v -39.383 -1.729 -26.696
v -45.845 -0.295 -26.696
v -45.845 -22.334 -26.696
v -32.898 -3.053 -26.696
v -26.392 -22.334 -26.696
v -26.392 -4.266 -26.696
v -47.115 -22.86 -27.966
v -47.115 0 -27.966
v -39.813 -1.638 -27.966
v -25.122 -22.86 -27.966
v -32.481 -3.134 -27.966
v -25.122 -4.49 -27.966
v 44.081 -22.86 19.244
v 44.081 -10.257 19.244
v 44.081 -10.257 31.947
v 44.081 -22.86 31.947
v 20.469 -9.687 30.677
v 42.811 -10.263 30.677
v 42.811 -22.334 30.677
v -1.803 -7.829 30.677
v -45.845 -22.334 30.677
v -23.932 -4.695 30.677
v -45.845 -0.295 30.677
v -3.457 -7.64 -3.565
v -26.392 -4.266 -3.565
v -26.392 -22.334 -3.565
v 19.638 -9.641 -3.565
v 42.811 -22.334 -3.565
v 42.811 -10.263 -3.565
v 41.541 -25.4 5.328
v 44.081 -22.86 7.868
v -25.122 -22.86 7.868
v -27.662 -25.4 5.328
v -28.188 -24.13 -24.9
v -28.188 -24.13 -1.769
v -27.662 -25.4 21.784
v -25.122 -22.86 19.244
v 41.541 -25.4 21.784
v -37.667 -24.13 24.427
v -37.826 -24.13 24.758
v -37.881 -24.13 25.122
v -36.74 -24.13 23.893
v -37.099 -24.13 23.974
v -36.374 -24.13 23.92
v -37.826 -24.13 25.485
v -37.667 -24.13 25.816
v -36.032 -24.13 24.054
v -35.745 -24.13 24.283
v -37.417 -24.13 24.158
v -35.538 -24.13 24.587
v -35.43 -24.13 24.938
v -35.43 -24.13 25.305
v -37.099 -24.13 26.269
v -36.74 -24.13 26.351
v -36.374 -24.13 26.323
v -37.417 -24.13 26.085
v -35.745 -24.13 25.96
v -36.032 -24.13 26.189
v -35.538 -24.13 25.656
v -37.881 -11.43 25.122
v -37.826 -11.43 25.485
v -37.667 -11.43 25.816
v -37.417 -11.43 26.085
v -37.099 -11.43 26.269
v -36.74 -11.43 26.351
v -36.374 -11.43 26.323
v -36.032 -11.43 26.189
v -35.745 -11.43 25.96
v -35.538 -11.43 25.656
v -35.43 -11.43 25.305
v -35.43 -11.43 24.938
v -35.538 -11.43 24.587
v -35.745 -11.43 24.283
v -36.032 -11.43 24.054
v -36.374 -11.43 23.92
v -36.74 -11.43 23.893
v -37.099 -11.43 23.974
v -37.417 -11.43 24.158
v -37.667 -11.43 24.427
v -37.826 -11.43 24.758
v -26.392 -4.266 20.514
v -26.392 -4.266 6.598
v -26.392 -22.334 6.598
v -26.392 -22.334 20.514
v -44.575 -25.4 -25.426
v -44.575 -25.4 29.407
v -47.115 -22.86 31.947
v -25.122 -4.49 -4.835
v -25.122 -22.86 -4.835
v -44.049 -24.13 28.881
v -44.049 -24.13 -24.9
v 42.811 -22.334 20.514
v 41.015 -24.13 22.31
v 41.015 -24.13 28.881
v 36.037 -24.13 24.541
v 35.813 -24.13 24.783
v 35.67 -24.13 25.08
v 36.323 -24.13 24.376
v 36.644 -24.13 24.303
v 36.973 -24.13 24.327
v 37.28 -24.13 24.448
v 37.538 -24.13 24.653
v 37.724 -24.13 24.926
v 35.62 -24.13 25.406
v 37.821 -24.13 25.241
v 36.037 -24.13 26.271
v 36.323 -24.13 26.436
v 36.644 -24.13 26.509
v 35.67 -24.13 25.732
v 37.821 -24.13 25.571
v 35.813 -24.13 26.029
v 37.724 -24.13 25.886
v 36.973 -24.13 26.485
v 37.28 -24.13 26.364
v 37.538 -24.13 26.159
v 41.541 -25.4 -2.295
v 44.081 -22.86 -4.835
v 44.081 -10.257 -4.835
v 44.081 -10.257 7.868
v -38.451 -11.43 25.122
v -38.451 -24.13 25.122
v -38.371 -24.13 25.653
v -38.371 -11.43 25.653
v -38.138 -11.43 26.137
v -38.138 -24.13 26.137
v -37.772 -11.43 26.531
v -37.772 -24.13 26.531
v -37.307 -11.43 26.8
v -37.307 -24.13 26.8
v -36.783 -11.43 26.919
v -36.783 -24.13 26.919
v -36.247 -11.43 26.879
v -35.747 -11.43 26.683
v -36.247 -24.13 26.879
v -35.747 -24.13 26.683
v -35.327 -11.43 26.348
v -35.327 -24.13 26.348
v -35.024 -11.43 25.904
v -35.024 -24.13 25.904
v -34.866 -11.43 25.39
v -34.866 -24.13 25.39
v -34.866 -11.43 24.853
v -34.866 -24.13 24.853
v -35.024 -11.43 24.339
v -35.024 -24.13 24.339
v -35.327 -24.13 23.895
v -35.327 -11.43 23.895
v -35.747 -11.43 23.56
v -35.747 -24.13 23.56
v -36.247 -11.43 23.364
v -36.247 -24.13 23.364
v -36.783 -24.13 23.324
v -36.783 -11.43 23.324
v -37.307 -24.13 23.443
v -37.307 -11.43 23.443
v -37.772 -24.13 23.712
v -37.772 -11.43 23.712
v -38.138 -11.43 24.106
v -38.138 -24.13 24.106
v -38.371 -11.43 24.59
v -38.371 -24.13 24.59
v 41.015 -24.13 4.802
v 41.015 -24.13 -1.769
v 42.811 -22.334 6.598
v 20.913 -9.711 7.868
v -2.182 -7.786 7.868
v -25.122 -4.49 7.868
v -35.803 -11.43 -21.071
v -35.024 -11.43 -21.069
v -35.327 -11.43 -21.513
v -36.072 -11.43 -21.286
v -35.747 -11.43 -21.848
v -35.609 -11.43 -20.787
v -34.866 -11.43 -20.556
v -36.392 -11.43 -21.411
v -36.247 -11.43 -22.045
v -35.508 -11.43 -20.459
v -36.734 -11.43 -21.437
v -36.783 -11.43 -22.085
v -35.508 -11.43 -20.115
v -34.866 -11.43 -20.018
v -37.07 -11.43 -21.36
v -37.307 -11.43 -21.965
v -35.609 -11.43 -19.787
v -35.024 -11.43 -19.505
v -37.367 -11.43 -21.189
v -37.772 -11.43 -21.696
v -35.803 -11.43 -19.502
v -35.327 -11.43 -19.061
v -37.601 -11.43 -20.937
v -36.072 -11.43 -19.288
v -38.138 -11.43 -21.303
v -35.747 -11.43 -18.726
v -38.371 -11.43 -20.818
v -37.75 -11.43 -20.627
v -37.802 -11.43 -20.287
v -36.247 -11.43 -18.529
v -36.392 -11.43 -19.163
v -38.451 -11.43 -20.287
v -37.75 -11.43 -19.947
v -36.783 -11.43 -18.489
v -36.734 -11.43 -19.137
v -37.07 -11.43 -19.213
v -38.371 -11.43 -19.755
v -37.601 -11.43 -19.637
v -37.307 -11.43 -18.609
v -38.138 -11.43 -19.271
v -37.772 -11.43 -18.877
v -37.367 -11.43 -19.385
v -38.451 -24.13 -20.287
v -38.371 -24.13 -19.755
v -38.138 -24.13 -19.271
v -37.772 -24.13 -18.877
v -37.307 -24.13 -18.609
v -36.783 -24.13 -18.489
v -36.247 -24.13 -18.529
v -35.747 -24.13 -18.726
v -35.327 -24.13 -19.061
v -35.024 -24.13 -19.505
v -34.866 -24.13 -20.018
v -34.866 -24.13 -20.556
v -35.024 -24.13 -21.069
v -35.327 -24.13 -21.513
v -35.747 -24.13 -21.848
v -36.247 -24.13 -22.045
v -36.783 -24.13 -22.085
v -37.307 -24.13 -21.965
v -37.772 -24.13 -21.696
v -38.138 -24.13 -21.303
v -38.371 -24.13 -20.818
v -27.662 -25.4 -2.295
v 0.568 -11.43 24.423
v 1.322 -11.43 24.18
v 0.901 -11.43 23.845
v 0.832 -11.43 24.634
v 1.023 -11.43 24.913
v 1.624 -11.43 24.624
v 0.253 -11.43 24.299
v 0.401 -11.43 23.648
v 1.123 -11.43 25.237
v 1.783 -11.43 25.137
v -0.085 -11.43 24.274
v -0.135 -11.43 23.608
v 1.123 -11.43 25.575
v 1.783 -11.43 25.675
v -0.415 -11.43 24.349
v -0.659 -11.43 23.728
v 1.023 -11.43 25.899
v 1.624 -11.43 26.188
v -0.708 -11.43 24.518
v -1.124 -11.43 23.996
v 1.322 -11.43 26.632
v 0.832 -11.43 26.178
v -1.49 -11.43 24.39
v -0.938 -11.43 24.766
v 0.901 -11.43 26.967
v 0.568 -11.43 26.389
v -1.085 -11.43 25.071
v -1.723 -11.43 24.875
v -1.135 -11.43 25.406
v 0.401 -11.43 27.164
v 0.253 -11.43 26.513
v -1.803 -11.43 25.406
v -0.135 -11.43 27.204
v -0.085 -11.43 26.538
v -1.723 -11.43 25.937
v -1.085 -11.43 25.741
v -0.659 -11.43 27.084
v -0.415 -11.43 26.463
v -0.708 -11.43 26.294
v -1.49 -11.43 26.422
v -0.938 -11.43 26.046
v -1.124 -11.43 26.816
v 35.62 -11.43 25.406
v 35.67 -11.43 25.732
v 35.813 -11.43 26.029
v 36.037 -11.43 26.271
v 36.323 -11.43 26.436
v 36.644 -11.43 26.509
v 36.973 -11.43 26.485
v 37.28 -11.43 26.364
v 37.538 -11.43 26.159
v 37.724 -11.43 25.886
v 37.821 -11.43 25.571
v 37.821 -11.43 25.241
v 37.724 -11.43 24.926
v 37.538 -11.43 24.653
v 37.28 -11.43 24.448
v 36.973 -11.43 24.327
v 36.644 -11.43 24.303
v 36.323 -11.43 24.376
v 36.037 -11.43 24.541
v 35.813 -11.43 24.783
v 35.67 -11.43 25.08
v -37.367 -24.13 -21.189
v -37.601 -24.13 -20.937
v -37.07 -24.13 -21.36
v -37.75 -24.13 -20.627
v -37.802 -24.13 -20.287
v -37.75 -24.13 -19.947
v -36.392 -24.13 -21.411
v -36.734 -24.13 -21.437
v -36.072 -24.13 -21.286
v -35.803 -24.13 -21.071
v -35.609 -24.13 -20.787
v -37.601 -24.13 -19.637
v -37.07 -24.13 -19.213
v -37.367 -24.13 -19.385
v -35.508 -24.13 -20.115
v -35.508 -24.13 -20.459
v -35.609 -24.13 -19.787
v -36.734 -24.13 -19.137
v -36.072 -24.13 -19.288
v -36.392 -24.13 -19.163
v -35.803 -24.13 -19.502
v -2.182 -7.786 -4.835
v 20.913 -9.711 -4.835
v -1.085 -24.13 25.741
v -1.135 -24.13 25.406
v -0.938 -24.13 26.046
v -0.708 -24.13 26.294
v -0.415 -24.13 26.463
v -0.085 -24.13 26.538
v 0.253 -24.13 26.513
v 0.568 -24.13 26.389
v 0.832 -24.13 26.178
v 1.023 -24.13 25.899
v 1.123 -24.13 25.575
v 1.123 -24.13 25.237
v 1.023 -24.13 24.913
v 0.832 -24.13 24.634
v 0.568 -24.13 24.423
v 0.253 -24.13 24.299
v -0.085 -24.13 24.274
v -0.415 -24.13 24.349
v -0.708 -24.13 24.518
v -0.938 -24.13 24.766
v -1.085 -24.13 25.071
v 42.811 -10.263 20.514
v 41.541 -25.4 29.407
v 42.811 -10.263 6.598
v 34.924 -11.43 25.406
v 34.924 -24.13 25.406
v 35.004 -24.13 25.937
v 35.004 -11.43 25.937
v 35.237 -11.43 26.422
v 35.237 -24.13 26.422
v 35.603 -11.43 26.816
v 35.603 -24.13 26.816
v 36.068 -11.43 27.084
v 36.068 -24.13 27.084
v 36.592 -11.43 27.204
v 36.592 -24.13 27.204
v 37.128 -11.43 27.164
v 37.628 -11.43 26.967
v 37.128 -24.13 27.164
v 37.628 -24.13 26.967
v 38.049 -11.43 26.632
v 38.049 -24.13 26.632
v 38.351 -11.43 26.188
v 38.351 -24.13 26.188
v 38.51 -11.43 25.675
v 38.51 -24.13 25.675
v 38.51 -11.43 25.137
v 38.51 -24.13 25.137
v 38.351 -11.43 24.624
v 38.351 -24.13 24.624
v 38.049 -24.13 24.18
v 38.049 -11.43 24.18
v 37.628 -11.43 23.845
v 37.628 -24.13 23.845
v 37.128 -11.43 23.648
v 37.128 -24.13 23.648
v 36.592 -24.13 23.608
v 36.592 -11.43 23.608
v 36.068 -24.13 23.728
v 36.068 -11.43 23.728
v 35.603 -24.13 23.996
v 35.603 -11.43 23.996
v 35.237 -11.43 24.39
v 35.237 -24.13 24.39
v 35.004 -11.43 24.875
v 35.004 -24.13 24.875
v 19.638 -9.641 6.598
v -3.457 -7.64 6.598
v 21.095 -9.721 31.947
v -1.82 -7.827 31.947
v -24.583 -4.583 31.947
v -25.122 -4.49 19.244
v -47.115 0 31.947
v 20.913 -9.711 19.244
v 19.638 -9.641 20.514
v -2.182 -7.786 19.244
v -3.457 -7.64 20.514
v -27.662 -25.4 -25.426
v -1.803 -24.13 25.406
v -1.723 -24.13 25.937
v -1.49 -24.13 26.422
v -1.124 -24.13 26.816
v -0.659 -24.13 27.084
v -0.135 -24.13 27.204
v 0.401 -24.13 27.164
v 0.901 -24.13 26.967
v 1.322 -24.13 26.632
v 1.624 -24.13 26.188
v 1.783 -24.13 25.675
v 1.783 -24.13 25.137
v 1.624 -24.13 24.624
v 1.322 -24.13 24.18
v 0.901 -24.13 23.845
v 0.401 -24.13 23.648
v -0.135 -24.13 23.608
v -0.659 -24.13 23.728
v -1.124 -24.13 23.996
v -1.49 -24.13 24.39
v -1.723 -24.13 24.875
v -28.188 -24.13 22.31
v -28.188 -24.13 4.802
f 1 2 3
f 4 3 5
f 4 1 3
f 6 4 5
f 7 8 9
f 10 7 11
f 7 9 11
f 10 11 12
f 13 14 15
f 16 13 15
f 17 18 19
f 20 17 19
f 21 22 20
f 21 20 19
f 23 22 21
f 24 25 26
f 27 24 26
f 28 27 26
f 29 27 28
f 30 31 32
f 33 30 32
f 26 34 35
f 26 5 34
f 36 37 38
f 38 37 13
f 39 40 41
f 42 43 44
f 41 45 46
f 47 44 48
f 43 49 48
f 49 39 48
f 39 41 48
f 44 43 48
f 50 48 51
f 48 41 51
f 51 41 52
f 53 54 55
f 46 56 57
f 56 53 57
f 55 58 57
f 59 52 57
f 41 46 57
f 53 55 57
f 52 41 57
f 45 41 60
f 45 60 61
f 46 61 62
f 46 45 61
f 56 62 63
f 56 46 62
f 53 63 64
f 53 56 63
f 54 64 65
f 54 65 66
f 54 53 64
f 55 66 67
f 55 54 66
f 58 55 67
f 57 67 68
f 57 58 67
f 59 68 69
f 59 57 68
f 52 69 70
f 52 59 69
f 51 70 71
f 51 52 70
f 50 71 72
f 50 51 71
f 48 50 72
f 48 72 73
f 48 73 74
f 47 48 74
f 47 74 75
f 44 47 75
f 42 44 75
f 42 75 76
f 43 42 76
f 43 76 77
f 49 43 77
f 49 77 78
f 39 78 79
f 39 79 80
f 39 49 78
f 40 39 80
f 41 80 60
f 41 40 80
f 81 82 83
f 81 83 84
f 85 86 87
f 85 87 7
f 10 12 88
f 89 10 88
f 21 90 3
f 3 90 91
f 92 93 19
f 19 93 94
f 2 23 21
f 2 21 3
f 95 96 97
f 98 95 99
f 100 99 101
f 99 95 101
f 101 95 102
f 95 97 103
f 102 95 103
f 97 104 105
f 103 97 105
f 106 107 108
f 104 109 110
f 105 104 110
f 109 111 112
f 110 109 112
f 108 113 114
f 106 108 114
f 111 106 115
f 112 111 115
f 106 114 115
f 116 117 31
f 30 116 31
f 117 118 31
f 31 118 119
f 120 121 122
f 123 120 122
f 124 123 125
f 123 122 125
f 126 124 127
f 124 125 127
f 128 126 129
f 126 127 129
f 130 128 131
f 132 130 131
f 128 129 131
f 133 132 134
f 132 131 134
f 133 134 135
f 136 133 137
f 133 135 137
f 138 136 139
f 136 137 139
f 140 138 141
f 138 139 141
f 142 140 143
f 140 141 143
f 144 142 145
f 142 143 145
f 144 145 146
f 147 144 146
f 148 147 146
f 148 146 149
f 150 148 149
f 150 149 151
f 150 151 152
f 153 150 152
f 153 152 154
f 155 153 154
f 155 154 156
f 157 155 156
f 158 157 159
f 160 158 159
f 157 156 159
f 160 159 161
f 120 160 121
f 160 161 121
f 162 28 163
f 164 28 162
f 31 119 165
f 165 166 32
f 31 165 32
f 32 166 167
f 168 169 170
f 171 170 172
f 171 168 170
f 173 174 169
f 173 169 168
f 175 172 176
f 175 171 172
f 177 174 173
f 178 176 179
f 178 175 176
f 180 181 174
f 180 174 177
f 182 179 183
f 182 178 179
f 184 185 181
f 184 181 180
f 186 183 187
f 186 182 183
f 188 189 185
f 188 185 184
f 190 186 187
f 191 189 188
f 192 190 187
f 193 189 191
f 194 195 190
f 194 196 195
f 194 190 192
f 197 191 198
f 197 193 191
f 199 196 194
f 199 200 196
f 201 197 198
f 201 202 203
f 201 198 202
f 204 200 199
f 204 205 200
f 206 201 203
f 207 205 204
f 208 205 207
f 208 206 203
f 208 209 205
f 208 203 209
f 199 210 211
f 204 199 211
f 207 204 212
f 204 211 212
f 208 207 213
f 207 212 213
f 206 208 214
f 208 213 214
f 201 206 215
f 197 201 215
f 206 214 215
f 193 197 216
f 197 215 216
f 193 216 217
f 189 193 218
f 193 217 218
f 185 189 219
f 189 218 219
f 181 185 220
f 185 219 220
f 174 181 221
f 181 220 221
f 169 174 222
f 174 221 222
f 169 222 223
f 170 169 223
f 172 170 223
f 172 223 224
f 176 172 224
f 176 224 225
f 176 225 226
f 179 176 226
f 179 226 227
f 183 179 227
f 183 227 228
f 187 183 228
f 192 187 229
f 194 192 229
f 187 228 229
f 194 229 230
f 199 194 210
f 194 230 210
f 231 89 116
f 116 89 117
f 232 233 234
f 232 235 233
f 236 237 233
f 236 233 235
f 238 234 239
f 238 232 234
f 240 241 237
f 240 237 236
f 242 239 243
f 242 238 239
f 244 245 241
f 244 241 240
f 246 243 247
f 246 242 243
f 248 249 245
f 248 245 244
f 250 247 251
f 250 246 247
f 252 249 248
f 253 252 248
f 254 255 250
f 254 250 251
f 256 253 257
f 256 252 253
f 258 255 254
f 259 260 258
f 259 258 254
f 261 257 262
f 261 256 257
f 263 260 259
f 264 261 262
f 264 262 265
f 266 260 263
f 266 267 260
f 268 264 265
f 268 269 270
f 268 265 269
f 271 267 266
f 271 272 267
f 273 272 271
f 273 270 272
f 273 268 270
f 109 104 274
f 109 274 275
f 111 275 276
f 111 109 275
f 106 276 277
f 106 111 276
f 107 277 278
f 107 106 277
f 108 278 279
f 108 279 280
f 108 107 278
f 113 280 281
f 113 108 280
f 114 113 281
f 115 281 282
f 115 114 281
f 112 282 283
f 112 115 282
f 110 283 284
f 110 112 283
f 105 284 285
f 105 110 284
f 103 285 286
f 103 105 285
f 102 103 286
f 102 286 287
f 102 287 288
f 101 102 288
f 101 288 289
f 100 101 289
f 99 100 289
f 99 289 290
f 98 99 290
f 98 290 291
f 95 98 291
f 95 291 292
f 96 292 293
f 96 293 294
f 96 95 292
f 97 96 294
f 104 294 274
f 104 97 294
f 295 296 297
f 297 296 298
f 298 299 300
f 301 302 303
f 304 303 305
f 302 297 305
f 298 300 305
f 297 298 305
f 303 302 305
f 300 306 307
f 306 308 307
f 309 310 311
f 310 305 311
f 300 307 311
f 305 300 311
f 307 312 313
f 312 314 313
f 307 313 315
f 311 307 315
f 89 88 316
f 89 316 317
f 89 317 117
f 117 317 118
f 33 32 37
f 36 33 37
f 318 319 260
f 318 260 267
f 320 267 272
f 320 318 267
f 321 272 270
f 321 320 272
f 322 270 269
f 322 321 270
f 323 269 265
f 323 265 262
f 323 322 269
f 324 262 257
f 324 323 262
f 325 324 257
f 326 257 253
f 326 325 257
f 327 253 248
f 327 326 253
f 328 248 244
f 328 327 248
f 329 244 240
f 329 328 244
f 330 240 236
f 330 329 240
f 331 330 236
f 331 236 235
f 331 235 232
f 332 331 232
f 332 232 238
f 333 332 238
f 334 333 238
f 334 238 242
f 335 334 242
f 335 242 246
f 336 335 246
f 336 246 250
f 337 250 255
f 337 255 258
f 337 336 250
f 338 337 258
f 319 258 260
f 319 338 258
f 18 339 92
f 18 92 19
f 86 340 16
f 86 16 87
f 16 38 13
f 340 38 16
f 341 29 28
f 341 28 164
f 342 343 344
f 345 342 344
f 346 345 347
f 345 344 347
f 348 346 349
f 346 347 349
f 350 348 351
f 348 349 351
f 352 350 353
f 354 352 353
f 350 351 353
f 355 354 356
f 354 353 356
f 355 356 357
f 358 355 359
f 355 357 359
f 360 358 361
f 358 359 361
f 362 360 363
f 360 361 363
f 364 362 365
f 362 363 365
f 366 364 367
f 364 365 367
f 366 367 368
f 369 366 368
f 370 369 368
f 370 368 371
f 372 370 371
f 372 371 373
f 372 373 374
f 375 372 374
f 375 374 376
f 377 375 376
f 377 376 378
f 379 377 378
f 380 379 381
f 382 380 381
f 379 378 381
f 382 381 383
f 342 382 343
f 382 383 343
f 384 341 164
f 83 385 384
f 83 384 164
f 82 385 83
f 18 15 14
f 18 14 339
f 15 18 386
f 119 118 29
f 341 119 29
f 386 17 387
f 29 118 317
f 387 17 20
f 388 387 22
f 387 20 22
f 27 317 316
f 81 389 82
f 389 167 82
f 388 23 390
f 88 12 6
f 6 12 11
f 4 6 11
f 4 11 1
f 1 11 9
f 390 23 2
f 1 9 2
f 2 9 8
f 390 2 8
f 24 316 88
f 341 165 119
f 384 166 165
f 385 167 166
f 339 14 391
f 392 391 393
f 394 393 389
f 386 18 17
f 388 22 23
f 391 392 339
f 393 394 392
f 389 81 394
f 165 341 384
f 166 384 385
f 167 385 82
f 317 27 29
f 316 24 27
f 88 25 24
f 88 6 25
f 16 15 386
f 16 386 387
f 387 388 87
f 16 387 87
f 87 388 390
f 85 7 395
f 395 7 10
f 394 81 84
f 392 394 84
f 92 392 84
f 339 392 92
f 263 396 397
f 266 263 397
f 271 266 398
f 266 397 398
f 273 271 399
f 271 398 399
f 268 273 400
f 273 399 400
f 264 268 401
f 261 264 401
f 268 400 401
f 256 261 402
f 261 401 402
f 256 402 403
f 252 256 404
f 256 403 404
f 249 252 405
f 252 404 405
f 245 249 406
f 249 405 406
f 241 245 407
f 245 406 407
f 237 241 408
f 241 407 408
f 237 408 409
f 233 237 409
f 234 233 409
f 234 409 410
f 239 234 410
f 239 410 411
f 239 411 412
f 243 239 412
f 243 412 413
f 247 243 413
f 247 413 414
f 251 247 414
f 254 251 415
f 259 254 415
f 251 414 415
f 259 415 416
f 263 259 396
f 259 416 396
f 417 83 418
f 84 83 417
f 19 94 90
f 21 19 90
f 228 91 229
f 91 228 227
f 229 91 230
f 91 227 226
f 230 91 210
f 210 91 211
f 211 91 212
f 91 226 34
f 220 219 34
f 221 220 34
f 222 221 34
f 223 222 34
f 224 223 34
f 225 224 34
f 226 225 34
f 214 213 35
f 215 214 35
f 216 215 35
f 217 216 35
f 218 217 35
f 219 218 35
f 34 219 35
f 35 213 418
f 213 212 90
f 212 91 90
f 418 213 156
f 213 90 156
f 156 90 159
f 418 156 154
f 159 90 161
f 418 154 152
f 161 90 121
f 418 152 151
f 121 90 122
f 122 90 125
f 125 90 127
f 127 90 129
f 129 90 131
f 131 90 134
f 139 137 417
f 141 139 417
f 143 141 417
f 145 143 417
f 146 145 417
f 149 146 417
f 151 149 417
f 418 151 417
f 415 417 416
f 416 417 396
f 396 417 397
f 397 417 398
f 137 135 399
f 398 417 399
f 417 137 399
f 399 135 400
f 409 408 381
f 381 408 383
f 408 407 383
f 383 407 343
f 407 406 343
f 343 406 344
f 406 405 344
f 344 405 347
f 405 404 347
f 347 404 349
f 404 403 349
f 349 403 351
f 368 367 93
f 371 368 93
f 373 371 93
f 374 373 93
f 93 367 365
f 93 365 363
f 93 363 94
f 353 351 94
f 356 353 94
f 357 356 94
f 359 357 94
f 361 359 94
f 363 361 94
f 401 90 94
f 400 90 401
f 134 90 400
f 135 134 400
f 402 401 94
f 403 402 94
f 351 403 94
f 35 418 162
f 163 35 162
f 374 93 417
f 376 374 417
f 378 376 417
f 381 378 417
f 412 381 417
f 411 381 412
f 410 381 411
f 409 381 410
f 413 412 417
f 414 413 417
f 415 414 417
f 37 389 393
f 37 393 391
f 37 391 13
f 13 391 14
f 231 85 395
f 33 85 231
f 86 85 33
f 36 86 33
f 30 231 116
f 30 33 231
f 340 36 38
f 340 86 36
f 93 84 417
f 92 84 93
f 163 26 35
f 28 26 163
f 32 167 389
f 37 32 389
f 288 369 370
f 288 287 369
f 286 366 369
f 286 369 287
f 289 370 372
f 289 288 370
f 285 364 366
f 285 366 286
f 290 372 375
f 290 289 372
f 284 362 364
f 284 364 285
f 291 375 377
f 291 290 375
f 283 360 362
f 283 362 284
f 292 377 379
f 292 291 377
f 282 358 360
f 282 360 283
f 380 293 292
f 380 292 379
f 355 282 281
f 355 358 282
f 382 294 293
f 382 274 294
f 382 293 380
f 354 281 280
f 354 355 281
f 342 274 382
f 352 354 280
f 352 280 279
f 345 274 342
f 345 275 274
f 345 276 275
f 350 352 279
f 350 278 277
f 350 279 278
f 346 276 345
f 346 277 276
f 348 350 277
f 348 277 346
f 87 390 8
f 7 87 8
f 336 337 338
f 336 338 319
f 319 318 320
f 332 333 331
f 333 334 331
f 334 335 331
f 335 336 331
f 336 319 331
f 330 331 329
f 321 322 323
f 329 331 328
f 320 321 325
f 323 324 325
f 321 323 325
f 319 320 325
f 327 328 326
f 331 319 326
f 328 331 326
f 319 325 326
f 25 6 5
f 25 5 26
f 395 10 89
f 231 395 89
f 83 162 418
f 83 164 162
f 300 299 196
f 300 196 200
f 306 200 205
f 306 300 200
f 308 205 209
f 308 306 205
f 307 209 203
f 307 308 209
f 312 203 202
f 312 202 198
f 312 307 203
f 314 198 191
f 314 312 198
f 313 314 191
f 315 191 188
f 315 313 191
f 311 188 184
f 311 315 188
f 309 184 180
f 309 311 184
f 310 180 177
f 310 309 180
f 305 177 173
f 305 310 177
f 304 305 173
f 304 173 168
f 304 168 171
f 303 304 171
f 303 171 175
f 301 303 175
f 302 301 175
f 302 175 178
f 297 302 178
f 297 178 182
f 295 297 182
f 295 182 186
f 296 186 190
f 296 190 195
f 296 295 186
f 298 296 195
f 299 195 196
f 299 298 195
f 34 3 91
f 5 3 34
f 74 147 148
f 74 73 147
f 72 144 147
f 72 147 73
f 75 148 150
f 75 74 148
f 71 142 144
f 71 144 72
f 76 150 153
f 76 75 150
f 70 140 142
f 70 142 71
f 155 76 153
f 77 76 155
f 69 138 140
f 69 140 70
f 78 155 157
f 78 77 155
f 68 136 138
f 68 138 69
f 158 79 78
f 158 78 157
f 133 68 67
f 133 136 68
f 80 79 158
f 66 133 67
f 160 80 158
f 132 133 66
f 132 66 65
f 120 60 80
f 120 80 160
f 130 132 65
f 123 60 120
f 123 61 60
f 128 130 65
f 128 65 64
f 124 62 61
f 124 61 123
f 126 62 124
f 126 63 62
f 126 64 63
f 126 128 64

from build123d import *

# Parameters (mm, degrees)
F1_DEPTH = 25.4
F2_SIZE  = 2.54
F3_SIZE  = 2.54
F4_T     = -1.27
F6_DEPTH = 38.1
F7_R     = 1.8028918562
F7_R_2   = 1.1064766703
F7_R_3   = 1.1353765366
F7_R_4   = 1.2323804773
F7_R_5   = 1.153275907
F8_DEPTH = 12.7


with BuildPart() as f1:
    # F0 (on Front) → F1 (new body)
    with BuildSketch(Plane.XZ):
        Polygon((44.08133775, 31.9471210241), (-47.1148937941, 31.9471210241), (-47.1148937941, -27.9655810446), (-25.1216236502, -27.9655810446), (-25.1216236502, -4.8347273842), (44.08133775, -4.8347273842), (44.08133775, 7.8682824969), (-25.1216236502, 7.8682824969), (-25.1216236502, 19.2441120744), (44.08133775, 19.2441120744), align=None)
    extrude(amount=F1_DEPTH)

    # F2
    f2_edges = [f1.edges().sort_by_distance(p)[0] for p in [
        (-1.516778, -25.4, 31.947121),
    ]]
    chamfer(f2_edges, length=F2_SIZE)

    # F3
    f3_edges = [f1.edges().sort_by_distance(p)[0] for p in [
        (44.081338, -25.4, 24.325617),
        (9.479857, -25.4, 19.244112),
        (-25.121624, -25.4, 13.556197),
        (9.479857, -25.4, 7.868282),
        (44.081338, -25.4, 1.516778),
        (9.479857, -25.4, -4.834727),
        (-25.121624, -25.4, -16.400154),
        (-36.118259, -25.4, -27.965581),
        (-47.114894, -25.4, 0.72077),
    ]]
    chamfer(f3_edges, length=F3_SIZE)

    # F4
    f4_openings = [f1.faces().sort_by_distance(p)[0] for p in [
        (-1.516778, 0, 30.855962),
    ]]
    offset(amount=F4_T, openings=f4_openings, kind=Kind.INTERSECTION)

    # F5 (on face) → F6 (cut, symmetric)
    with BuildSketch(Plane(origin=(0, 0, -4.8347273842), x_dir=(1, 0, 0), z_dir=(0, 0, -1))):
        with BuildLine():
            Line((44.08133775, 0), (44.08133775, 10.256701149))
            ThreePointArc((44.08133775, 10.256701149), (-1.820328138, 7.8273301251), (-47.1148937941, 0))
            Line((-47.1148937941, 0), (44.08133775, 0))
        make_face()
    extrude(amount=F6_DEPTH, both=True, mode=Mode.SUBTRACT)

    # F7 (on face) → F8 (join)
    with BuildSketch(Plane(origin=(0, -24.13, 0), x_dir=(-1, 0, 0), z_dir=(0, 1, 0))):
        with Locations((-36.7269202571, 25.4060197622)):
            Circle(F7_R)
        with Locations((-36.7269202571, 25.4060197622)):
            Circle(F7_R_2, mode=Mode.SUBTRACT)
        with Locations((0, 25.4060197622)):
            Circle(F7_R)
        with Locations((0, 25.4060197622)):
            Circle(F7_R_3, mode=Mode.SUBTRACT)
        with Locations((36.6482846439, 25.1216236502)):
            Circle(F7_R)
        with Locations((36.6482846439, 25.1216236502)):
            Circle(F7_R_4, mode=Mode.SUBTRACT)
        with Locations((36.6482846439, -20.2868953347)):
            Circle(F7_R)
        with Locations((36.6482846439, -20.2868953347)):
            Circle(F7_R_5, mode=Mode.SUBTRACT)
    extrude(amount=F8_DEPTH)


solid = f1.part
